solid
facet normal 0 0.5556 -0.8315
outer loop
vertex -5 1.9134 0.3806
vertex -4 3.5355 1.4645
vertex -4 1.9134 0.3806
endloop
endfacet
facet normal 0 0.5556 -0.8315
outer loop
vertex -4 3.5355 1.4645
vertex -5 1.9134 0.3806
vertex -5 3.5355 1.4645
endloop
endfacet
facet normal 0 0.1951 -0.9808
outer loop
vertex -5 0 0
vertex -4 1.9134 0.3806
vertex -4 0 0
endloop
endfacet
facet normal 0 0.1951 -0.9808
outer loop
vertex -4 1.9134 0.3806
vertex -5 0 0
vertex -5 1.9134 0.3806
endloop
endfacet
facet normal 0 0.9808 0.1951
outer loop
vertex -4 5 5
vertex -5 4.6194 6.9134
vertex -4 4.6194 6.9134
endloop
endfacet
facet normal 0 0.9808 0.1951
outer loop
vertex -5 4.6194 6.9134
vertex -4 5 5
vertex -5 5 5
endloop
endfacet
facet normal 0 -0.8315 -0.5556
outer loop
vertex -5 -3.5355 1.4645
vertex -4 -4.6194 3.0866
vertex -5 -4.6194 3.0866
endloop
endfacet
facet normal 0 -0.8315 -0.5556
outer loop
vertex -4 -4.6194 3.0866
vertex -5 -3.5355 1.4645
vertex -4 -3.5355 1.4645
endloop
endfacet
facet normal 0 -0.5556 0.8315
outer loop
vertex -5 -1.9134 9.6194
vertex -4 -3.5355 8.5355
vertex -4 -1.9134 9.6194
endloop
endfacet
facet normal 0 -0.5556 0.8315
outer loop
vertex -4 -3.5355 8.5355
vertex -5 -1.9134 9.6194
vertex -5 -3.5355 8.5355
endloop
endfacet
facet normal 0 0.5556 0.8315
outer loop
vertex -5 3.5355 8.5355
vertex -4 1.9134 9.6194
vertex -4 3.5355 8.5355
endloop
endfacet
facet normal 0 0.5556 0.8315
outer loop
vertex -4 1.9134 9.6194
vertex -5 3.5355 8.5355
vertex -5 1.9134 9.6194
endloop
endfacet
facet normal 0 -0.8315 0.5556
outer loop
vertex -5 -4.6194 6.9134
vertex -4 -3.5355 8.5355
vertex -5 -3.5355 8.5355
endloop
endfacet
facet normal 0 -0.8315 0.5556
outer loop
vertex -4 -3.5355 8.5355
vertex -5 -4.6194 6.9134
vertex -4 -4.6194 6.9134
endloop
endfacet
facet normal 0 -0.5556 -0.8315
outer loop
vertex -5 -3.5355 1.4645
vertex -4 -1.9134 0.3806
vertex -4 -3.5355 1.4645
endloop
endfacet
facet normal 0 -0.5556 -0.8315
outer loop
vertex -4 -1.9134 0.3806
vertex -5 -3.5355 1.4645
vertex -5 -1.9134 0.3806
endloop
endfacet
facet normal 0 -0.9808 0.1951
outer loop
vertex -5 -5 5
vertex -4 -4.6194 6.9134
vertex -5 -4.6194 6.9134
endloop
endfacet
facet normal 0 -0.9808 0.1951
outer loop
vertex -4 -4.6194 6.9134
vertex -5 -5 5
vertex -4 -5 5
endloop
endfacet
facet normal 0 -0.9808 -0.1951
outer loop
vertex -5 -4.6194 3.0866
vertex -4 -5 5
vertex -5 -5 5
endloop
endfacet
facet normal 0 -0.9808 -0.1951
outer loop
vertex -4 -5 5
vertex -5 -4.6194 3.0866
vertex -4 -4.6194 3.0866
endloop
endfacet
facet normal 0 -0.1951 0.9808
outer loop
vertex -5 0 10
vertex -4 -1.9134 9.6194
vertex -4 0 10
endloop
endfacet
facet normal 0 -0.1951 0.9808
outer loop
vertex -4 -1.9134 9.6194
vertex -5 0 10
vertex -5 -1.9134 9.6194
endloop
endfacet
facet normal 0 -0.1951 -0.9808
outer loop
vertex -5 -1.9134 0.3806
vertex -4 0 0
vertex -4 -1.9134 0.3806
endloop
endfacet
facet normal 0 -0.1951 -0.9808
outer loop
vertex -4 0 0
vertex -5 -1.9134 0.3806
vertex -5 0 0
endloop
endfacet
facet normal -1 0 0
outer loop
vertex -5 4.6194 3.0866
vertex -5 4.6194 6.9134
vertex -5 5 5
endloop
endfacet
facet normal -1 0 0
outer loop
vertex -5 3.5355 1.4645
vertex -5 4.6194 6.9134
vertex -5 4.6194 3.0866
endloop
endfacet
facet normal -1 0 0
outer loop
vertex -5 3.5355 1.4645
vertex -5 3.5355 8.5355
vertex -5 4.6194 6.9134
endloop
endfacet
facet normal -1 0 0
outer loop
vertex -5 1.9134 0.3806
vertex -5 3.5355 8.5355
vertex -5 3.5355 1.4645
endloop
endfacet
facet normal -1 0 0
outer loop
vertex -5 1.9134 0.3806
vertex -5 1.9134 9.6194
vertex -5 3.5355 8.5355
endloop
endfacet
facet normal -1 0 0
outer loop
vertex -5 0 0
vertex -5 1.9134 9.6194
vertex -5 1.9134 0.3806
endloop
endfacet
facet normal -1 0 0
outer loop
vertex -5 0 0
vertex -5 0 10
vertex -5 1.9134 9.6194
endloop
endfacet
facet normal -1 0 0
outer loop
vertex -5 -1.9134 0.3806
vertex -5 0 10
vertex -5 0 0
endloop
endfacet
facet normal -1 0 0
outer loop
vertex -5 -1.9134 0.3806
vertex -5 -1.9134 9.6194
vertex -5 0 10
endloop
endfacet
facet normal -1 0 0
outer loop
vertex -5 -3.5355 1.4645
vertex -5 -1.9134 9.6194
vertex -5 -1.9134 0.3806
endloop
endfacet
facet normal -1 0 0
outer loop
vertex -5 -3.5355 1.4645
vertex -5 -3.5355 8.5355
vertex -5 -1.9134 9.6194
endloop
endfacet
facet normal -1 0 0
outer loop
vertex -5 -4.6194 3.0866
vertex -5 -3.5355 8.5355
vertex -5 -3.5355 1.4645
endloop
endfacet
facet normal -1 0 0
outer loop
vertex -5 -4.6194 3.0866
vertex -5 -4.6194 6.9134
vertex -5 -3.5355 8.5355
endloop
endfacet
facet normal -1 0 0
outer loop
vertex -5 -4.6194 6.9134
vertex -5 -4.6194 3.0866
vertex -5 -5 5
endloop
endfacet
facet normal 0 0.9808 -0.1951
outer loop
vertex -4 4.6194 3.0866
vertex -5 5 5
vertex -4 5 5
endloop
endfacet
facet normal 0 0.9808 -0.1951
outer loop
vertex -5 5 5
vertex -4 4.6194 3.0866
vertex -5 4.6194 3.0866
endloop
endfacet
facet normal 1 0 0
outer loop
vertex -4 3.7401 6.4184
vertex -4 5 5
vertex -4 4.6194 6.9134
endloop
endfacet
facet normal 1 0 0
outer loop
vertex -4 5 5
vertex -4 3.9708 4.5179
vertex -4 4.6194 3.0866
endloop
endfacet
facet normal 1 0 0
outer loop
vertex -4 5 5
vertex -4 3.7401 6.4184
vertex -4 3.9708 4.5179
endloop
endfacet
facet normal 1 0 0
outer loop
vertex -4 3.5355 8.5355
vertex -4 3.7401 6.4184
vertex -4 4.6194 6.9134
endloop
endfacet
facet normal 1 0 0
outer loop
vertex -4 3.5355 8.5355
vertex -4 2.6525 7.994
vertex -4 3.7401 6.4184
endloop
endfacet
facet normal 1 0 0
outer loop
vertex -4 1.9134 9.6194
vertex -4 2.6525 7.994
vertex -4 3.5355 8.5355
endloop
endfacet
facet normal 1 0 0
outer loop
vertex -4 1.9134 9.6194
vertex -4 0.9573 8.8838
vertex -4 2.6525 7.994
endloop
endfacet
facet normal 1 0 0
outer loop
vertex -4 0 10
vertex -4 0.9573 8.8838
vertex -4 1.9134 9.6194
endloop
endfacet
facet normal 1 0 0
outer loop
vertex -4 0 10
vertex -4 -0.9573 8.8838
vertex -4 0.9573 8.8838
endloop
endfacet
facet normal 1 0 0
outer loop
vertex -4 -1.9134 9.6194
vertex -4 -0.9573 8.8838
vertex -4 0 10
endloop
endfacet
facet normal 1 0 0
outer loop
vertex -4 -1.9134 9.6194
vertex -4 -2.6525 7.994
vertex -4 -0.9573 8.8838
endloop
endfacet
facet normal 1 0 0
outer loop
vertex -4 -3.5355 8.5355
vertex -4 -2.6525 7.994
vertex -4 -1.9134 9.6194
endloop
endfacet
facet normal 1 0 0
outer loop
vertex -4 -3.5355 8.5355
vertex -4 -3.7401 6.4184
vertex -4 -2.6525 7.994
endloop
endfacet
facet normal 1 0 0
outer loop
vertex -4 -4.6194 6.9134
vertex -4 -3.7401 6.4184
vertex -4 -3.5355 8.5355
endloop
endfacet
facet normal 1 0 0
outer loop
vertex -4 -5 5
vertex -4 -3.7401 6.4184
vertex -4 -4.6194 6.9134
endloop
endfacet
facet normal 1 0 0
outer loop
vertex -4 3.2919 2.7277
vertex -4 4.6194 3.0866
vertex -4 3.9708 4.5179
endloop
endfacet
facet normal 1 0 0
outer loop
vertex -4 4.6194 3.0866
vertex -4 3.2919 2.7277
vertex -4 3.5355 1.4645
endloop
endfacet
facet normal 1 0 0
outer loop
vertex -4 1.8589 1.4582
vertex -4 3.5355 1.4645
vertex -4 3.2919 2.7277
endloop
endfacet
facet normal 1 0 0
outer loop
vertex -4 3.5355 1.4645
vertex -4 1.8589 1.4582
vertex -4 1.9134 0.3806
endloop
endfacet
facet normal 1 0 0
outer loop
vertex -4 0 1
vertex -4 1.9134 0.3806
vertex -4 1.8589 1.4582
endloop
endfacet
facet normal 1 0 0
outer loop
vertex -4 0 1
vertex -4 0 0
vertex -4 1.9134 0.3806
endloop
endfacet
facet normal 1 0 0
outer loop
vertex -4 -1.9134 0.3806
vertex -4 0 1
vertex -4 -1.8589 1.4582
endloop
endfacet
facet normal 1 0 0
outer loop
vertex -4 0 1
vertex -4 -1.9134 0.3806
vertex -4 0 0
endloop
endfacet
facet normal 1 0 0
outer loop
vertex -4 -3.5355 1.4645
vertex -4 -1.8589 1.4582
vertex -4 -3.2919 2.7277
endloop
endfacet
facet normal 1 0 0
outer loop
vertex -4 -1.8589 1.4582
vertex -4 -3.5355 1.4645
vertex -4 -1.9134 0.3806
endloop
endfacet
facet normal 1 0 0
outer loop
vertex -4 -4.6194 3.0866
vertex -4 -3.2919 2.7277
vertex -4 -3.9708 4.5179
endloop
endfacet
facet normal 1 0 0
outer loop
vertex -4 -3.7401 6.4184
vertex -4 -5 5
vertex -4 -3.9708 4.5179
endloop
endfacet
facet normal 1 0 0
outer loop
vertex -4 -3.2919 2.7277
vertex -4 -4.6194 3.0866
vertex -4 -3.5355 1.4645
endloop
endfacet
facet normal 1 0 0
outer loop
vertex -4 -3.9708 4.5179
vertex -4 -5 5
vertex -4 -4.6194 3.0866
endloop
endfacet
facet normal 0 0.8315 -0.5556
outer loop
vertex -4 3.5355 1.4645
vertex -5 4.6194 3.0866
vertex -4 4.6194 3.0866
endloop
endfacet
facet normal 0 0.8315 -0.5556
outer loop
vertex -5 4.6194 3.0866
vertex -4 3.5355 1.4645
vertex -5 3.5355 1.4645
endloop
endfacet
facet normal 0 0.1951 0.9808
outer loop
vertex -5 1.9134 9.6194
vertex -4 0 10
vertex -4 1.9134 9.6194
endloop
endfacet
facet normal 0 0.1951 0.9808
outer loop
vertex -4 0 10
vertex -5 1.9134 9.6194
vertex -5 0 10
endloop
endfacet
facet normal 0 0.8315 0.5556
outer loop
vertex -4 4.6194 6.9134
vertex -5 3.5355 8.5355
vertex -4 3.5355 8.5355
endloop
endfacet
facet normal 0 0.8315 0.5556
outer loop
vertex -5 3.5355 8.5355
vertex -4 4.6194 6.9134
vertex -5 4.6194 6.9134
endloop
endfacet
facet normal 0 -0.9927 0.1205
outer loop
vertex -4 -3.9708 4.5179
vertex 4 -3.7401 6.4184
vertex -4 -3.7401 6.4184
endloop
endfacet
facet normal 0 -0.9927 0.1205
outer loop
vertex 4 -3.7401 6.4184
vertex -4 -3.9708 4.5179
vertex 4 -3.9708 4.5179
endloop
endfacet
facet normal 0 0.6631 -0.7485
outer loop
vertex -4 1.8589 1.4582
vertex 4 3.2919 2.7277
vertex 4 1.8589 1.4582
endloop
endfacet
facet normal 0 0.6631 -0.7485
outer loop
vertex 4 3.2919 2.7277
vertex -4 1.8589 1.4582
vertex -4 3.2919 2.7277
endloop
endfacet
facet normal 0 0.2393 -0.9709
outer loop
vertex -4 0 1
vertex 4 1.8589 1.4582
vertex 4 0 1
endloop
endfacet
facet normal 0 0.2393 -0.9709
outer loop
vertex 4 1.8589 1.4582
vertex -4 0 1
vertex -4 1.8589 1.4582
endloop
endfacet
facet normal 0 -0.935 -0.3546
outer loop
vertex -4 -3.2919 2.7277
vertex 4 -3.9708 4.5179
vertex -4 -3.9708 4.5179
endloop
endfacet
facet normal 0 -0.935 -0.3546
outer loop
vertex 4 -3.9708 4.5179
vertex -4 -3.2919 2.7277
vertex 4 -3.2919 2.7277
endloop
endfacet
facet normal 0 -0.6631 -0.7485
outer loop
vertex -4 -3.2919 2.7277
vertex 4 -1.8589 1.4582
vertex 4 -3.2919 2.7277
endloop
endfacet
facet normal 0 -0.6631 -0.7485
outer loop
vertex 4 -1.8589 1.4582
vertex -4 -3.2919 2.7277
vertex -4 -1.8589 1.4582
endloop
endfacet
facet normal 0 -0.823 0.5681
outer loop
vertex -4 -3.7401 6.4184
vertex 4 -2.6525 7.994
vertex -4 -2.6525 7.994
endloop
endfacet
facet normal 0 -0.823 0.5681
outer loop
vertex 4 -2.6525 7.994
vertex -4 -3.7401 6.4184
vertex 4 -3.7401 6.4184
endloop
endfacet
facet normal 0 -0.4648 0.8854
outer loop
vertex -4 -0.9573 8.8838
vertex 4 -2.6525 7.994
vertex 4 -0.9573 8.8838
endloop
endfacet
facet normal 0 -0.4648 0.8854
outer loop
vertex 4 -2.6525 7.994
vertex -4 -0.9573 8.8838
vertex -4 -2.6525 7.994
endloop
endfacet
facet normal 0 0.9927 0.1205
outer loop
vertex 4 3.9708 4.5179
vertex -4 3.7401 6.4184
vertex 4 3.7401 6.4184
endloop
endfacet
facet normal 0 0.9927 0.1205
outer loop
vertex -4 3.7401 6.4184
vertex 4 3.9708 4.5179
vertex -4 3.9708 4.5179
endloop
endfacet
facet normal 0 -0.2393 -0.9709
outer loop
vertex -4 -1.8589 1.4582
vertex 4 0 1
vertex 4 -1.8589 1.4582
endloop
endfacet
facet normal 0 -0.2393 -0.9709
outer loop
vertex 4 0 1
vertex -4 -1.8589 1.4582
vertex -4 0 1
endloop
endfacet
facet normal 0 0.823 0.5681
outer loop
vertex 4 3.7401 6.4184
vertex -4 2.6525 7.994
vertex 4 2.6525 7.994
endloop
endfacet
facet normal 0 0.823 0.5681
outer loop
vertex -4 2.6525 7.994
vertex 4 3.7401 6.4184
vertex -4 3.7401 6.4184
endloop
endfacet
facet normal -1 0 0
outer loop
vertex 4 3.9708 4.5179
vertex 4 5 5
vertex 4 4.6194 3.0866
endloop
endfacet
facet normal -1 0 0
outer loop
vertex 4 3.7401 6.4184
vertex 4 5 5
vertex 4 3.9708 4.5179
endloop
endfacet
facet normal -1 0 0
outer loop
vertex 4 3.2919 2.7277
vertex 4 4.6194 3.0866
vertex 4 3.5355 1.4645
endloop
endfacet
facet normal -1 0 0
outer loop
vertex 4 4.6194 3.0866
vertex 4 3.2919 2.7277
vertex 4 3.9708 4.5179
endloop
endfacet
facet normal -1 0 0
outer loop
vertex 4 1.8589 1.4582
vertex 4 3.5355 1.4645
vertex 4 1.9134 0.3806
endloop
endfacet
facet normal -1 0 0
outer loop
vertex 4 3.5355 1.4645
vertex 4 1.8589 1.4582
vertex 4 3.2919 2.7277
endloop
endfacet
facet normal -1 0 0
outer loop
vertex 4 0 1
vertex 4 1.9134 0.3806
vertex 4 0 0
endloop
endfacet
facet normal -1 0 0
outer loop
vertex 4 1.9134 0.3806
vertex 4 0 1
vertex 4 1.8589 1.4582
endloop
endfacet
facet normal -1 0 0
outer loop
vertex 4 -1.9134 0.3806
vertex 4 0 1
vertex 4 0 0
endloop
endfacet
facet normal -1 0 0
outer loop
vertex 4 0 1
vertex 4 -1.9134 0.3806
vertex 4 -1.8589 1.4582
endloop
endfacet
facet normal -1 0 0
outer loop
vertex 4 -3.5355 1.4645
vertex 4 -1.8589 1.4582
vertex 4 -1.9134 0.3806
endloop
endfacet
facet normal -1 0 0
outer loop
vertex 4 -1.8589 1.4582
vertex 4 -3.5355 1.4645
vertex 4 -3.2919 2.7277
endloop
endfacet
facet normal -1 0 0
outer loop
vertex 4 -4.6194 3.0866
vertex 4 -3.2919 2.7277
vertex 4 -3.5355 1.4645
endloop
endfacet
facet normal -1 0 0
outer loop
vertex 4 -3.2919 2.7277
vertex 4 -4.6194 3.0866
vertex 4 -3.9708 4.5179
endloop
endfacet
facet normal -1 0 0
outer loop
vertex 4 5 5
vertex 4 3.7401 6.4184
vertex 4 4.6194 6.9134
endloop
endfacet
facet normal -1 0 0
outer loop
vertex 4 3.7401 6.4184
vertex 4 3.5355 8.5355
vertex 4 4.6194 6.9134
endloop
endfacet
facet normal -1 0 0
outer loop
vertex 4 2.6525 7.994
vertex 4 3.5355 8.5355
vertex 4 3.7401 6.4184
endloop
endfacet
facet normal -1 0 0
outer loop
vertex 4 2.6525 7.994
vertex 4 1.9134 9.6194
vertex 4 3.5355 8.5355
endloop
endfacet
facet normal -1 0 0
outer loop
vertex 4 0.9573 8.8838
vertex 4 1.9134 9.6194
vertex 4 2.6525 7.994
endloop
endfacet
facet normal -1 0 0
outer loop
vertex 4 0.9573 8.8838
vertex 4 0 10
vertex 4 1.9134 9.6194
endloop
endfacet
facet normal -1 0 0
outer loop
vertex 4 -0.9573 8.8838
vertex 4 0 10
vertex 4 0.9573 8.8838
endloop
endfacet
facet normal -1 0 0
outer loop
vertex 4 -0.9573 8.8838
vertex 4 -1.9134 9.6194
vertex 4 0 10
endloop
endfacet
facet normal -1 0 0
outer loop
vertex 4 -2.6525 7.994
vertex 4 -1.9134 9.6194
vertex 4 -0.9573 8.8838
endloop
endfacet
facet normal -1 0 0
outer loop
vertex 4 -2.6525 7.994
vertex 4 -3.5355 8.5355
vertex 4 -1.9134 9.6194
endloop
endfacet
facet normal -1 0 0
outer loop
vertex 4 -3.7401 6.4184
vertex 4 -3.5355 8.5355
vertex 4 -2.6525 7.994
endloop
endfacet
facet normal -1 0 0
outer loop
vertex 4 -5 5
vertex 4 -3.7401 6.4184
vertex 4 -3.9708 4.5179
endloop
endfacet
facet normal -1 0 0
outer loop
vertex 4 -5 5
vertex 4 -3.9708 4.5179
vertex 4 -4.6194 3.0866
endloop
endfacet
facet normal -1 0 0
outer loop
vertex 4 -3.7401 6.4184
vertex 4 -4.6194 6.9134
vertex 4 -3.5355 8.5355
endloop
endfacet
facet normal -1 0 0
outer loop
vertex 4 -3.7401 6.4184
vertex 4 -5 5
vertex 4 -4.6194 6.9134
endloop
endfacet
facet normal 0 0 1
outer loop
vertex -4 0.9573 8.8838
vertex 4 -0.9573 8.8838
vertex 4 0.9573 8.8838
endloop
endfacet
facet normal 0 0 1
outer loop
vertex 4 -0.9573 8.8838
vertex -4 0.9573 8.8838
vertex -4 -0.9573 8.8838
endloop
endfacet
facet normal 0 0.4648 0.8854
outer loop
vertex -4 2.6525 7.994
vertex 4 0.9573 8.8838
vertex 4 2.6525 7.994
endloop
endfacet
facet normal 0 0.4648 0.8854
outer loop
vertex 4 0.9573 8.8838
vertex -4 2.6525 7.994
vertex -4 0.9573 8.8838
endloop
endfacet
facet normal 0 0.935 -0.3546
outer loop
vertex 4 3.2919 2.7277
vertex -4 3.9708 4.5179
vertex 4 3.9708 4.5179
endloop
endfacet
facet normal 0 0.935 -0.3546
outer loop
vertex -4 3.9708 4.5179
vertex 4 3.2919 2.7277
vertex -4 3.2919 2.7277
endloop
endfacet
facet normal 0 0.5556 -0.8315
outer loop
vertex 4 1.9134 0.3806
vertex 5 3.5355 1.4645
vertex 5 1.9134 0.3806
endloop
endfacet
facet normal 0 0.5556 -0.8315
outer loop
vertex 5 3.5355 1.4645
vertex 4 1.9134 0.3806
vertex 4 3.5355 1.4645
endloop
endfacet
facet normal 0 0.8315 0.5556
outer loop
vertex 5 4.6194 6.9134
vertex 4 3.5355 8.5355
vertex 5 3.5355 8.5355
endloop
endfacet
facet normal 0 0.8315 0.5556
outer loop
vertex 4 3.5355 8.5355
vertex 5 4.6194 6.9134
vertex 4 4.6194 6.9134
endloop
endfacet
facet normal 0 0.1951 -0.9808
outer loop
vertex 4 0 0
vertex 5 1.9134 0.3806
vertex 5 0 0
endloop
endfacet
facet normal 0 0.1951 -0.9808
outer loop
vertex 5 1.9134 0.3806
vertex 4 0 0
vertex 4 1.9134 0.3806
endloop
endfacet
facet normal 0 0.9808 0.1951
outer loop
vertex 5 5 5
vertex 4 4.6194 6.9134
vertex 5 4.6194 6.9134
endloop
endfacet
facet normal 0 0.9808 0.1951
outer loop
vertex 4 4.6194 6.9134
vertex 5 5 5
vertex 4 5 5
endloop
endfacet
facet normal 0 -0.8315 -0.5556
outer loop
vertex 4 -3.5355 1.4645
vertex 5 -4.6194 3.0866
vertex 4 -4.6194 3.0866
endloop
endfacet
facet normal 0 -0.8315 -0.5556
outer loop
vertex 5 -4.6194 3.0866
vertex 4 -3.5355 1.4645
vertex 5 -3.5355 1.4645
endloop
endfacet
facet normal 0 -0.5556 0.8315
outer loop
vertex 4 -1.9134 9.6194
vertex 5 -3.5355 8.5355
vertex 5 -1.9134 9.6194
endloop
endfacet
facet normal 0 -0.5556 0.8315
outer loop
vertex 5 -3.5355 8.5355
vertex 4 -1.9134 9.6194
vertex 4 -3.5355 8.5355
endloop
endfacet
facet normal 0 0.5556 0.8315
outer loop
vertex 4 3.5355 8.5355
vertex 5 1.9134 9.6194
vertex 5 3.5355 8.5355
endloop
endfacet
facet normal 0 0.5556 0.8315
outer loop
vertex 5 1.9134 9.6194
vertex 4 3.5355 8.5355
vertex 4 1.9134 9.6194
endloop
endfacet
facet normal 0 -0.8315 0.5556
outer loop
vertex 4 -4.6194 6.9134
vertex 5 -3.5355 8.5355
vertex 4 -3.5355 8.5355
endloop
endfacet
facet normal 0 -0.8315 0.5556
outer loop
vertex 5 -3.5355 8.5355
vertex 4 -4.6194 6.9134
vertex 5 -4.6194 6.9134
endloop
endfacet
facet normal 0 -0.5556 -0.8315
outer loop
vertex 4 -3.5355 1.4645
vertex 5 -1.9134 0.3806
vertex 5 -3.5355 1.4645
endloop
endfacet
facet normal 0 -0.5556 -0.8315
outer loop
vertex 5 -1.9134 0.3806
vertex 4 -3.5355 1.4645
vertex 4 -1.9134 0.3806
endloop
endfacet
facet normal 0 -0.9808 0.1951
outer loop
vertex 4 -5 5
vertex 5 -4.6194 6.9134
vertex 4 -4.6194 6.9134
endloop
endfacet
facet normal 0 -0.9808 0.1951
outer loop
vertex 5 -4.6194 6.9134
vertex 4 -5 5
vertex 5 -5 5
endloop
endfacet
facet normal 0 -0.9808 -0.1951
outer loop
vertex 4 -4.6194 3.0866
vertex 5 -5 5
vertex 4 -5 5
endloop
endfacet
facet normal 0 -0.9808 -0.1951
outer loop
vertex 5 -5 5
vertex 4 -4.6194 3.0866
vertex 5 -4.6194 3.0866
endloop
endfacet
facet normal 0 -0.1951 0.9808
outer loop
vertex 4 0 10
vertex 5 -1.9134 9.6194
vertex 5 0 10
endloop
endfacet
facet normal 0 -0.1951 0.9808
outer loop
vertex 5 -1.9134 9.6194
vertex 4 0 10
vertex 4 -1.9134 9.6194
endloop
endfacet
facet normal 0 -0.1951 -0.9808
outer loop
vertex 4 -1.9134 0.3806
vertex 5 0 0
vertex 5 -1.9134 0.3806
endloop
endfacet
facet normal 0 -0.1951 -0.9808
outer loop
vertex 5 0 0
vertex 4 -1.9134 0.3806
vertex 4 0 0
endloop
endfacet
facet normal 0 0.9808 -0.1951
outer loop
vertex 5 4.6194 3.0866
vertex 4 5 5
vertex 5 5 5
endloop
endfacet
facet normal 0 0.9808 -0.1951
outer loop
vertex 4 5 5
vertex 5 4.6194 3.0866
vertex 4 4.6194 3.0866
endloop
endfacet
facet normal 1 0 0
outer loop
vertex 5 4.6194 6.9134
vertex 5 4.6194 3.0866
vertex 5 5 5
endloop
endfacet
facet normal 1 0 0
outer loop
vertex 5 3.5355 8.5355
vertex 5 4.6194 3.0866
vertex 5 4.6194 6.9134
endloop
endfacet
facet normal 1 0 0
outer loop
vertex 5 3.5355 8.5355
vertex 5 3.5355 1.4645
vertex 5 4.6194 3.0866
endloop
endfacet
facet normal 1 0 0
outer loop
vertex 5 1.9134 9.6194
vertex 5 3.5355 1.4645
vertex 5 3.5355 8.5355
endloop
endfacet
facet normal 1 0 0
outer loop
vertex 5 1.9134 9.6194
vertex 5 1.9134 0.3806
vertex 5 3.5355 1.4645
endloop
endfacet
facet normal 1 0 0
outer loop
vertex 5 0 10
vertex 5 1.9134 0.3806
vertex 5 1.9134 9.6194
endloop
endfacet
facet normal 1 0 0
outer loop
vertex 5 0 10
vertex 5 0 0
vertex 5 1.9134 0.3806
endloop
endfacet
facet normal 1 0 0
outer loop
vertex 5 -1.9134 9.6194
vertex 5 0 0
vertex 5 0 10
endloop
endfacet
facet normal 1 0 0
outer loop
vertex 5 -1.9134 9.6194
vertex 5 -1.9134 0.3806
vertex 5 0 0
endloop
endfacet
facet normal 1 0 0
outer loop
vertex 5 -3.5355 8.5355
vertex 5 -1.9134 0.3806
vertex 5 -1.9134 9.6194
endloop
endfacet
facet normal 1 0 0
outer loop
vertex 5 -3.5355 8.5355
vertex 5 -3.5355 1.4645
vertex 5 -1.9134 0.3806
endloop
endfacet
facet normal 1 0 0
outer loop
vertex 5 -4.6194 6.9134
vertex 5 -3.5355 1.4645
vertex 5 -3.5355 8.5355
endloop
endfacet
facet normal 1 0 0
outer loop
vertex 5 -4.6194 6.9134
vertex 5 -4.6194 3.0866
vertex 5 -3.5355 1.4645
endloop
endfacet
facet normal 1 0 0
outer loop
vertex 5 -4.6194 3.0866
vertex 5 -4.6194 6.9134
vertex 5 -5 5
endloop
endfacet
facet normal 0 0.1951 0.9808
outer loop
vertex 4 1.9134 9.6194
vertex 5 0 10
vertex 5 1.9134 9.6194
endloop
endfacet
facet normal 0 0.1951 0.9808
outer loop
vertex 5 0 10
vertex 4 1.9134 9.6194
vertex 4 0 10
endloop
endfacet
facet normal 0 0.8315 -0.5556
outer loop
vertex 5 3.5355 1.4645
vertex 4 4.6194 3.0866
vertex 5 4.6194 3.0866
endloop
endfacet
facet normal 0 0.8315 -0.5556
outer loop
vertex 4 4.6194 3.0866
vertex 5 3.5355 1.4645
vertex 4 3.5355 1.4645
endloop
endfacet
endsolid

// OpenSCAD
tank_wheel(10, 10, 2, 1);

module tank_wheel(wheel_width, wheel_diameter, track_thickness, track_inset)
{
    translate([-(wheel_width/2), 0 ,wheel_diameter/2])
    rotate([0,90,0])
    {
        linear_extrude(height = track_inset, scale = 1.0)
        circle(d=wheel_diameter, false);
        
        translate([0, 0, track_inset])
        linear_extrude(height = wheel_width - (2 * track_inset), scale = 1.0)
        circle(d=wheel_diameter - track_thickness, false);
        
        translate([0, 0, wheel_width - track_inset])
        linear_extrude(height = track_inset, scale = 1.0)
        circle(d=wheel_diameter, false);
    }
}
